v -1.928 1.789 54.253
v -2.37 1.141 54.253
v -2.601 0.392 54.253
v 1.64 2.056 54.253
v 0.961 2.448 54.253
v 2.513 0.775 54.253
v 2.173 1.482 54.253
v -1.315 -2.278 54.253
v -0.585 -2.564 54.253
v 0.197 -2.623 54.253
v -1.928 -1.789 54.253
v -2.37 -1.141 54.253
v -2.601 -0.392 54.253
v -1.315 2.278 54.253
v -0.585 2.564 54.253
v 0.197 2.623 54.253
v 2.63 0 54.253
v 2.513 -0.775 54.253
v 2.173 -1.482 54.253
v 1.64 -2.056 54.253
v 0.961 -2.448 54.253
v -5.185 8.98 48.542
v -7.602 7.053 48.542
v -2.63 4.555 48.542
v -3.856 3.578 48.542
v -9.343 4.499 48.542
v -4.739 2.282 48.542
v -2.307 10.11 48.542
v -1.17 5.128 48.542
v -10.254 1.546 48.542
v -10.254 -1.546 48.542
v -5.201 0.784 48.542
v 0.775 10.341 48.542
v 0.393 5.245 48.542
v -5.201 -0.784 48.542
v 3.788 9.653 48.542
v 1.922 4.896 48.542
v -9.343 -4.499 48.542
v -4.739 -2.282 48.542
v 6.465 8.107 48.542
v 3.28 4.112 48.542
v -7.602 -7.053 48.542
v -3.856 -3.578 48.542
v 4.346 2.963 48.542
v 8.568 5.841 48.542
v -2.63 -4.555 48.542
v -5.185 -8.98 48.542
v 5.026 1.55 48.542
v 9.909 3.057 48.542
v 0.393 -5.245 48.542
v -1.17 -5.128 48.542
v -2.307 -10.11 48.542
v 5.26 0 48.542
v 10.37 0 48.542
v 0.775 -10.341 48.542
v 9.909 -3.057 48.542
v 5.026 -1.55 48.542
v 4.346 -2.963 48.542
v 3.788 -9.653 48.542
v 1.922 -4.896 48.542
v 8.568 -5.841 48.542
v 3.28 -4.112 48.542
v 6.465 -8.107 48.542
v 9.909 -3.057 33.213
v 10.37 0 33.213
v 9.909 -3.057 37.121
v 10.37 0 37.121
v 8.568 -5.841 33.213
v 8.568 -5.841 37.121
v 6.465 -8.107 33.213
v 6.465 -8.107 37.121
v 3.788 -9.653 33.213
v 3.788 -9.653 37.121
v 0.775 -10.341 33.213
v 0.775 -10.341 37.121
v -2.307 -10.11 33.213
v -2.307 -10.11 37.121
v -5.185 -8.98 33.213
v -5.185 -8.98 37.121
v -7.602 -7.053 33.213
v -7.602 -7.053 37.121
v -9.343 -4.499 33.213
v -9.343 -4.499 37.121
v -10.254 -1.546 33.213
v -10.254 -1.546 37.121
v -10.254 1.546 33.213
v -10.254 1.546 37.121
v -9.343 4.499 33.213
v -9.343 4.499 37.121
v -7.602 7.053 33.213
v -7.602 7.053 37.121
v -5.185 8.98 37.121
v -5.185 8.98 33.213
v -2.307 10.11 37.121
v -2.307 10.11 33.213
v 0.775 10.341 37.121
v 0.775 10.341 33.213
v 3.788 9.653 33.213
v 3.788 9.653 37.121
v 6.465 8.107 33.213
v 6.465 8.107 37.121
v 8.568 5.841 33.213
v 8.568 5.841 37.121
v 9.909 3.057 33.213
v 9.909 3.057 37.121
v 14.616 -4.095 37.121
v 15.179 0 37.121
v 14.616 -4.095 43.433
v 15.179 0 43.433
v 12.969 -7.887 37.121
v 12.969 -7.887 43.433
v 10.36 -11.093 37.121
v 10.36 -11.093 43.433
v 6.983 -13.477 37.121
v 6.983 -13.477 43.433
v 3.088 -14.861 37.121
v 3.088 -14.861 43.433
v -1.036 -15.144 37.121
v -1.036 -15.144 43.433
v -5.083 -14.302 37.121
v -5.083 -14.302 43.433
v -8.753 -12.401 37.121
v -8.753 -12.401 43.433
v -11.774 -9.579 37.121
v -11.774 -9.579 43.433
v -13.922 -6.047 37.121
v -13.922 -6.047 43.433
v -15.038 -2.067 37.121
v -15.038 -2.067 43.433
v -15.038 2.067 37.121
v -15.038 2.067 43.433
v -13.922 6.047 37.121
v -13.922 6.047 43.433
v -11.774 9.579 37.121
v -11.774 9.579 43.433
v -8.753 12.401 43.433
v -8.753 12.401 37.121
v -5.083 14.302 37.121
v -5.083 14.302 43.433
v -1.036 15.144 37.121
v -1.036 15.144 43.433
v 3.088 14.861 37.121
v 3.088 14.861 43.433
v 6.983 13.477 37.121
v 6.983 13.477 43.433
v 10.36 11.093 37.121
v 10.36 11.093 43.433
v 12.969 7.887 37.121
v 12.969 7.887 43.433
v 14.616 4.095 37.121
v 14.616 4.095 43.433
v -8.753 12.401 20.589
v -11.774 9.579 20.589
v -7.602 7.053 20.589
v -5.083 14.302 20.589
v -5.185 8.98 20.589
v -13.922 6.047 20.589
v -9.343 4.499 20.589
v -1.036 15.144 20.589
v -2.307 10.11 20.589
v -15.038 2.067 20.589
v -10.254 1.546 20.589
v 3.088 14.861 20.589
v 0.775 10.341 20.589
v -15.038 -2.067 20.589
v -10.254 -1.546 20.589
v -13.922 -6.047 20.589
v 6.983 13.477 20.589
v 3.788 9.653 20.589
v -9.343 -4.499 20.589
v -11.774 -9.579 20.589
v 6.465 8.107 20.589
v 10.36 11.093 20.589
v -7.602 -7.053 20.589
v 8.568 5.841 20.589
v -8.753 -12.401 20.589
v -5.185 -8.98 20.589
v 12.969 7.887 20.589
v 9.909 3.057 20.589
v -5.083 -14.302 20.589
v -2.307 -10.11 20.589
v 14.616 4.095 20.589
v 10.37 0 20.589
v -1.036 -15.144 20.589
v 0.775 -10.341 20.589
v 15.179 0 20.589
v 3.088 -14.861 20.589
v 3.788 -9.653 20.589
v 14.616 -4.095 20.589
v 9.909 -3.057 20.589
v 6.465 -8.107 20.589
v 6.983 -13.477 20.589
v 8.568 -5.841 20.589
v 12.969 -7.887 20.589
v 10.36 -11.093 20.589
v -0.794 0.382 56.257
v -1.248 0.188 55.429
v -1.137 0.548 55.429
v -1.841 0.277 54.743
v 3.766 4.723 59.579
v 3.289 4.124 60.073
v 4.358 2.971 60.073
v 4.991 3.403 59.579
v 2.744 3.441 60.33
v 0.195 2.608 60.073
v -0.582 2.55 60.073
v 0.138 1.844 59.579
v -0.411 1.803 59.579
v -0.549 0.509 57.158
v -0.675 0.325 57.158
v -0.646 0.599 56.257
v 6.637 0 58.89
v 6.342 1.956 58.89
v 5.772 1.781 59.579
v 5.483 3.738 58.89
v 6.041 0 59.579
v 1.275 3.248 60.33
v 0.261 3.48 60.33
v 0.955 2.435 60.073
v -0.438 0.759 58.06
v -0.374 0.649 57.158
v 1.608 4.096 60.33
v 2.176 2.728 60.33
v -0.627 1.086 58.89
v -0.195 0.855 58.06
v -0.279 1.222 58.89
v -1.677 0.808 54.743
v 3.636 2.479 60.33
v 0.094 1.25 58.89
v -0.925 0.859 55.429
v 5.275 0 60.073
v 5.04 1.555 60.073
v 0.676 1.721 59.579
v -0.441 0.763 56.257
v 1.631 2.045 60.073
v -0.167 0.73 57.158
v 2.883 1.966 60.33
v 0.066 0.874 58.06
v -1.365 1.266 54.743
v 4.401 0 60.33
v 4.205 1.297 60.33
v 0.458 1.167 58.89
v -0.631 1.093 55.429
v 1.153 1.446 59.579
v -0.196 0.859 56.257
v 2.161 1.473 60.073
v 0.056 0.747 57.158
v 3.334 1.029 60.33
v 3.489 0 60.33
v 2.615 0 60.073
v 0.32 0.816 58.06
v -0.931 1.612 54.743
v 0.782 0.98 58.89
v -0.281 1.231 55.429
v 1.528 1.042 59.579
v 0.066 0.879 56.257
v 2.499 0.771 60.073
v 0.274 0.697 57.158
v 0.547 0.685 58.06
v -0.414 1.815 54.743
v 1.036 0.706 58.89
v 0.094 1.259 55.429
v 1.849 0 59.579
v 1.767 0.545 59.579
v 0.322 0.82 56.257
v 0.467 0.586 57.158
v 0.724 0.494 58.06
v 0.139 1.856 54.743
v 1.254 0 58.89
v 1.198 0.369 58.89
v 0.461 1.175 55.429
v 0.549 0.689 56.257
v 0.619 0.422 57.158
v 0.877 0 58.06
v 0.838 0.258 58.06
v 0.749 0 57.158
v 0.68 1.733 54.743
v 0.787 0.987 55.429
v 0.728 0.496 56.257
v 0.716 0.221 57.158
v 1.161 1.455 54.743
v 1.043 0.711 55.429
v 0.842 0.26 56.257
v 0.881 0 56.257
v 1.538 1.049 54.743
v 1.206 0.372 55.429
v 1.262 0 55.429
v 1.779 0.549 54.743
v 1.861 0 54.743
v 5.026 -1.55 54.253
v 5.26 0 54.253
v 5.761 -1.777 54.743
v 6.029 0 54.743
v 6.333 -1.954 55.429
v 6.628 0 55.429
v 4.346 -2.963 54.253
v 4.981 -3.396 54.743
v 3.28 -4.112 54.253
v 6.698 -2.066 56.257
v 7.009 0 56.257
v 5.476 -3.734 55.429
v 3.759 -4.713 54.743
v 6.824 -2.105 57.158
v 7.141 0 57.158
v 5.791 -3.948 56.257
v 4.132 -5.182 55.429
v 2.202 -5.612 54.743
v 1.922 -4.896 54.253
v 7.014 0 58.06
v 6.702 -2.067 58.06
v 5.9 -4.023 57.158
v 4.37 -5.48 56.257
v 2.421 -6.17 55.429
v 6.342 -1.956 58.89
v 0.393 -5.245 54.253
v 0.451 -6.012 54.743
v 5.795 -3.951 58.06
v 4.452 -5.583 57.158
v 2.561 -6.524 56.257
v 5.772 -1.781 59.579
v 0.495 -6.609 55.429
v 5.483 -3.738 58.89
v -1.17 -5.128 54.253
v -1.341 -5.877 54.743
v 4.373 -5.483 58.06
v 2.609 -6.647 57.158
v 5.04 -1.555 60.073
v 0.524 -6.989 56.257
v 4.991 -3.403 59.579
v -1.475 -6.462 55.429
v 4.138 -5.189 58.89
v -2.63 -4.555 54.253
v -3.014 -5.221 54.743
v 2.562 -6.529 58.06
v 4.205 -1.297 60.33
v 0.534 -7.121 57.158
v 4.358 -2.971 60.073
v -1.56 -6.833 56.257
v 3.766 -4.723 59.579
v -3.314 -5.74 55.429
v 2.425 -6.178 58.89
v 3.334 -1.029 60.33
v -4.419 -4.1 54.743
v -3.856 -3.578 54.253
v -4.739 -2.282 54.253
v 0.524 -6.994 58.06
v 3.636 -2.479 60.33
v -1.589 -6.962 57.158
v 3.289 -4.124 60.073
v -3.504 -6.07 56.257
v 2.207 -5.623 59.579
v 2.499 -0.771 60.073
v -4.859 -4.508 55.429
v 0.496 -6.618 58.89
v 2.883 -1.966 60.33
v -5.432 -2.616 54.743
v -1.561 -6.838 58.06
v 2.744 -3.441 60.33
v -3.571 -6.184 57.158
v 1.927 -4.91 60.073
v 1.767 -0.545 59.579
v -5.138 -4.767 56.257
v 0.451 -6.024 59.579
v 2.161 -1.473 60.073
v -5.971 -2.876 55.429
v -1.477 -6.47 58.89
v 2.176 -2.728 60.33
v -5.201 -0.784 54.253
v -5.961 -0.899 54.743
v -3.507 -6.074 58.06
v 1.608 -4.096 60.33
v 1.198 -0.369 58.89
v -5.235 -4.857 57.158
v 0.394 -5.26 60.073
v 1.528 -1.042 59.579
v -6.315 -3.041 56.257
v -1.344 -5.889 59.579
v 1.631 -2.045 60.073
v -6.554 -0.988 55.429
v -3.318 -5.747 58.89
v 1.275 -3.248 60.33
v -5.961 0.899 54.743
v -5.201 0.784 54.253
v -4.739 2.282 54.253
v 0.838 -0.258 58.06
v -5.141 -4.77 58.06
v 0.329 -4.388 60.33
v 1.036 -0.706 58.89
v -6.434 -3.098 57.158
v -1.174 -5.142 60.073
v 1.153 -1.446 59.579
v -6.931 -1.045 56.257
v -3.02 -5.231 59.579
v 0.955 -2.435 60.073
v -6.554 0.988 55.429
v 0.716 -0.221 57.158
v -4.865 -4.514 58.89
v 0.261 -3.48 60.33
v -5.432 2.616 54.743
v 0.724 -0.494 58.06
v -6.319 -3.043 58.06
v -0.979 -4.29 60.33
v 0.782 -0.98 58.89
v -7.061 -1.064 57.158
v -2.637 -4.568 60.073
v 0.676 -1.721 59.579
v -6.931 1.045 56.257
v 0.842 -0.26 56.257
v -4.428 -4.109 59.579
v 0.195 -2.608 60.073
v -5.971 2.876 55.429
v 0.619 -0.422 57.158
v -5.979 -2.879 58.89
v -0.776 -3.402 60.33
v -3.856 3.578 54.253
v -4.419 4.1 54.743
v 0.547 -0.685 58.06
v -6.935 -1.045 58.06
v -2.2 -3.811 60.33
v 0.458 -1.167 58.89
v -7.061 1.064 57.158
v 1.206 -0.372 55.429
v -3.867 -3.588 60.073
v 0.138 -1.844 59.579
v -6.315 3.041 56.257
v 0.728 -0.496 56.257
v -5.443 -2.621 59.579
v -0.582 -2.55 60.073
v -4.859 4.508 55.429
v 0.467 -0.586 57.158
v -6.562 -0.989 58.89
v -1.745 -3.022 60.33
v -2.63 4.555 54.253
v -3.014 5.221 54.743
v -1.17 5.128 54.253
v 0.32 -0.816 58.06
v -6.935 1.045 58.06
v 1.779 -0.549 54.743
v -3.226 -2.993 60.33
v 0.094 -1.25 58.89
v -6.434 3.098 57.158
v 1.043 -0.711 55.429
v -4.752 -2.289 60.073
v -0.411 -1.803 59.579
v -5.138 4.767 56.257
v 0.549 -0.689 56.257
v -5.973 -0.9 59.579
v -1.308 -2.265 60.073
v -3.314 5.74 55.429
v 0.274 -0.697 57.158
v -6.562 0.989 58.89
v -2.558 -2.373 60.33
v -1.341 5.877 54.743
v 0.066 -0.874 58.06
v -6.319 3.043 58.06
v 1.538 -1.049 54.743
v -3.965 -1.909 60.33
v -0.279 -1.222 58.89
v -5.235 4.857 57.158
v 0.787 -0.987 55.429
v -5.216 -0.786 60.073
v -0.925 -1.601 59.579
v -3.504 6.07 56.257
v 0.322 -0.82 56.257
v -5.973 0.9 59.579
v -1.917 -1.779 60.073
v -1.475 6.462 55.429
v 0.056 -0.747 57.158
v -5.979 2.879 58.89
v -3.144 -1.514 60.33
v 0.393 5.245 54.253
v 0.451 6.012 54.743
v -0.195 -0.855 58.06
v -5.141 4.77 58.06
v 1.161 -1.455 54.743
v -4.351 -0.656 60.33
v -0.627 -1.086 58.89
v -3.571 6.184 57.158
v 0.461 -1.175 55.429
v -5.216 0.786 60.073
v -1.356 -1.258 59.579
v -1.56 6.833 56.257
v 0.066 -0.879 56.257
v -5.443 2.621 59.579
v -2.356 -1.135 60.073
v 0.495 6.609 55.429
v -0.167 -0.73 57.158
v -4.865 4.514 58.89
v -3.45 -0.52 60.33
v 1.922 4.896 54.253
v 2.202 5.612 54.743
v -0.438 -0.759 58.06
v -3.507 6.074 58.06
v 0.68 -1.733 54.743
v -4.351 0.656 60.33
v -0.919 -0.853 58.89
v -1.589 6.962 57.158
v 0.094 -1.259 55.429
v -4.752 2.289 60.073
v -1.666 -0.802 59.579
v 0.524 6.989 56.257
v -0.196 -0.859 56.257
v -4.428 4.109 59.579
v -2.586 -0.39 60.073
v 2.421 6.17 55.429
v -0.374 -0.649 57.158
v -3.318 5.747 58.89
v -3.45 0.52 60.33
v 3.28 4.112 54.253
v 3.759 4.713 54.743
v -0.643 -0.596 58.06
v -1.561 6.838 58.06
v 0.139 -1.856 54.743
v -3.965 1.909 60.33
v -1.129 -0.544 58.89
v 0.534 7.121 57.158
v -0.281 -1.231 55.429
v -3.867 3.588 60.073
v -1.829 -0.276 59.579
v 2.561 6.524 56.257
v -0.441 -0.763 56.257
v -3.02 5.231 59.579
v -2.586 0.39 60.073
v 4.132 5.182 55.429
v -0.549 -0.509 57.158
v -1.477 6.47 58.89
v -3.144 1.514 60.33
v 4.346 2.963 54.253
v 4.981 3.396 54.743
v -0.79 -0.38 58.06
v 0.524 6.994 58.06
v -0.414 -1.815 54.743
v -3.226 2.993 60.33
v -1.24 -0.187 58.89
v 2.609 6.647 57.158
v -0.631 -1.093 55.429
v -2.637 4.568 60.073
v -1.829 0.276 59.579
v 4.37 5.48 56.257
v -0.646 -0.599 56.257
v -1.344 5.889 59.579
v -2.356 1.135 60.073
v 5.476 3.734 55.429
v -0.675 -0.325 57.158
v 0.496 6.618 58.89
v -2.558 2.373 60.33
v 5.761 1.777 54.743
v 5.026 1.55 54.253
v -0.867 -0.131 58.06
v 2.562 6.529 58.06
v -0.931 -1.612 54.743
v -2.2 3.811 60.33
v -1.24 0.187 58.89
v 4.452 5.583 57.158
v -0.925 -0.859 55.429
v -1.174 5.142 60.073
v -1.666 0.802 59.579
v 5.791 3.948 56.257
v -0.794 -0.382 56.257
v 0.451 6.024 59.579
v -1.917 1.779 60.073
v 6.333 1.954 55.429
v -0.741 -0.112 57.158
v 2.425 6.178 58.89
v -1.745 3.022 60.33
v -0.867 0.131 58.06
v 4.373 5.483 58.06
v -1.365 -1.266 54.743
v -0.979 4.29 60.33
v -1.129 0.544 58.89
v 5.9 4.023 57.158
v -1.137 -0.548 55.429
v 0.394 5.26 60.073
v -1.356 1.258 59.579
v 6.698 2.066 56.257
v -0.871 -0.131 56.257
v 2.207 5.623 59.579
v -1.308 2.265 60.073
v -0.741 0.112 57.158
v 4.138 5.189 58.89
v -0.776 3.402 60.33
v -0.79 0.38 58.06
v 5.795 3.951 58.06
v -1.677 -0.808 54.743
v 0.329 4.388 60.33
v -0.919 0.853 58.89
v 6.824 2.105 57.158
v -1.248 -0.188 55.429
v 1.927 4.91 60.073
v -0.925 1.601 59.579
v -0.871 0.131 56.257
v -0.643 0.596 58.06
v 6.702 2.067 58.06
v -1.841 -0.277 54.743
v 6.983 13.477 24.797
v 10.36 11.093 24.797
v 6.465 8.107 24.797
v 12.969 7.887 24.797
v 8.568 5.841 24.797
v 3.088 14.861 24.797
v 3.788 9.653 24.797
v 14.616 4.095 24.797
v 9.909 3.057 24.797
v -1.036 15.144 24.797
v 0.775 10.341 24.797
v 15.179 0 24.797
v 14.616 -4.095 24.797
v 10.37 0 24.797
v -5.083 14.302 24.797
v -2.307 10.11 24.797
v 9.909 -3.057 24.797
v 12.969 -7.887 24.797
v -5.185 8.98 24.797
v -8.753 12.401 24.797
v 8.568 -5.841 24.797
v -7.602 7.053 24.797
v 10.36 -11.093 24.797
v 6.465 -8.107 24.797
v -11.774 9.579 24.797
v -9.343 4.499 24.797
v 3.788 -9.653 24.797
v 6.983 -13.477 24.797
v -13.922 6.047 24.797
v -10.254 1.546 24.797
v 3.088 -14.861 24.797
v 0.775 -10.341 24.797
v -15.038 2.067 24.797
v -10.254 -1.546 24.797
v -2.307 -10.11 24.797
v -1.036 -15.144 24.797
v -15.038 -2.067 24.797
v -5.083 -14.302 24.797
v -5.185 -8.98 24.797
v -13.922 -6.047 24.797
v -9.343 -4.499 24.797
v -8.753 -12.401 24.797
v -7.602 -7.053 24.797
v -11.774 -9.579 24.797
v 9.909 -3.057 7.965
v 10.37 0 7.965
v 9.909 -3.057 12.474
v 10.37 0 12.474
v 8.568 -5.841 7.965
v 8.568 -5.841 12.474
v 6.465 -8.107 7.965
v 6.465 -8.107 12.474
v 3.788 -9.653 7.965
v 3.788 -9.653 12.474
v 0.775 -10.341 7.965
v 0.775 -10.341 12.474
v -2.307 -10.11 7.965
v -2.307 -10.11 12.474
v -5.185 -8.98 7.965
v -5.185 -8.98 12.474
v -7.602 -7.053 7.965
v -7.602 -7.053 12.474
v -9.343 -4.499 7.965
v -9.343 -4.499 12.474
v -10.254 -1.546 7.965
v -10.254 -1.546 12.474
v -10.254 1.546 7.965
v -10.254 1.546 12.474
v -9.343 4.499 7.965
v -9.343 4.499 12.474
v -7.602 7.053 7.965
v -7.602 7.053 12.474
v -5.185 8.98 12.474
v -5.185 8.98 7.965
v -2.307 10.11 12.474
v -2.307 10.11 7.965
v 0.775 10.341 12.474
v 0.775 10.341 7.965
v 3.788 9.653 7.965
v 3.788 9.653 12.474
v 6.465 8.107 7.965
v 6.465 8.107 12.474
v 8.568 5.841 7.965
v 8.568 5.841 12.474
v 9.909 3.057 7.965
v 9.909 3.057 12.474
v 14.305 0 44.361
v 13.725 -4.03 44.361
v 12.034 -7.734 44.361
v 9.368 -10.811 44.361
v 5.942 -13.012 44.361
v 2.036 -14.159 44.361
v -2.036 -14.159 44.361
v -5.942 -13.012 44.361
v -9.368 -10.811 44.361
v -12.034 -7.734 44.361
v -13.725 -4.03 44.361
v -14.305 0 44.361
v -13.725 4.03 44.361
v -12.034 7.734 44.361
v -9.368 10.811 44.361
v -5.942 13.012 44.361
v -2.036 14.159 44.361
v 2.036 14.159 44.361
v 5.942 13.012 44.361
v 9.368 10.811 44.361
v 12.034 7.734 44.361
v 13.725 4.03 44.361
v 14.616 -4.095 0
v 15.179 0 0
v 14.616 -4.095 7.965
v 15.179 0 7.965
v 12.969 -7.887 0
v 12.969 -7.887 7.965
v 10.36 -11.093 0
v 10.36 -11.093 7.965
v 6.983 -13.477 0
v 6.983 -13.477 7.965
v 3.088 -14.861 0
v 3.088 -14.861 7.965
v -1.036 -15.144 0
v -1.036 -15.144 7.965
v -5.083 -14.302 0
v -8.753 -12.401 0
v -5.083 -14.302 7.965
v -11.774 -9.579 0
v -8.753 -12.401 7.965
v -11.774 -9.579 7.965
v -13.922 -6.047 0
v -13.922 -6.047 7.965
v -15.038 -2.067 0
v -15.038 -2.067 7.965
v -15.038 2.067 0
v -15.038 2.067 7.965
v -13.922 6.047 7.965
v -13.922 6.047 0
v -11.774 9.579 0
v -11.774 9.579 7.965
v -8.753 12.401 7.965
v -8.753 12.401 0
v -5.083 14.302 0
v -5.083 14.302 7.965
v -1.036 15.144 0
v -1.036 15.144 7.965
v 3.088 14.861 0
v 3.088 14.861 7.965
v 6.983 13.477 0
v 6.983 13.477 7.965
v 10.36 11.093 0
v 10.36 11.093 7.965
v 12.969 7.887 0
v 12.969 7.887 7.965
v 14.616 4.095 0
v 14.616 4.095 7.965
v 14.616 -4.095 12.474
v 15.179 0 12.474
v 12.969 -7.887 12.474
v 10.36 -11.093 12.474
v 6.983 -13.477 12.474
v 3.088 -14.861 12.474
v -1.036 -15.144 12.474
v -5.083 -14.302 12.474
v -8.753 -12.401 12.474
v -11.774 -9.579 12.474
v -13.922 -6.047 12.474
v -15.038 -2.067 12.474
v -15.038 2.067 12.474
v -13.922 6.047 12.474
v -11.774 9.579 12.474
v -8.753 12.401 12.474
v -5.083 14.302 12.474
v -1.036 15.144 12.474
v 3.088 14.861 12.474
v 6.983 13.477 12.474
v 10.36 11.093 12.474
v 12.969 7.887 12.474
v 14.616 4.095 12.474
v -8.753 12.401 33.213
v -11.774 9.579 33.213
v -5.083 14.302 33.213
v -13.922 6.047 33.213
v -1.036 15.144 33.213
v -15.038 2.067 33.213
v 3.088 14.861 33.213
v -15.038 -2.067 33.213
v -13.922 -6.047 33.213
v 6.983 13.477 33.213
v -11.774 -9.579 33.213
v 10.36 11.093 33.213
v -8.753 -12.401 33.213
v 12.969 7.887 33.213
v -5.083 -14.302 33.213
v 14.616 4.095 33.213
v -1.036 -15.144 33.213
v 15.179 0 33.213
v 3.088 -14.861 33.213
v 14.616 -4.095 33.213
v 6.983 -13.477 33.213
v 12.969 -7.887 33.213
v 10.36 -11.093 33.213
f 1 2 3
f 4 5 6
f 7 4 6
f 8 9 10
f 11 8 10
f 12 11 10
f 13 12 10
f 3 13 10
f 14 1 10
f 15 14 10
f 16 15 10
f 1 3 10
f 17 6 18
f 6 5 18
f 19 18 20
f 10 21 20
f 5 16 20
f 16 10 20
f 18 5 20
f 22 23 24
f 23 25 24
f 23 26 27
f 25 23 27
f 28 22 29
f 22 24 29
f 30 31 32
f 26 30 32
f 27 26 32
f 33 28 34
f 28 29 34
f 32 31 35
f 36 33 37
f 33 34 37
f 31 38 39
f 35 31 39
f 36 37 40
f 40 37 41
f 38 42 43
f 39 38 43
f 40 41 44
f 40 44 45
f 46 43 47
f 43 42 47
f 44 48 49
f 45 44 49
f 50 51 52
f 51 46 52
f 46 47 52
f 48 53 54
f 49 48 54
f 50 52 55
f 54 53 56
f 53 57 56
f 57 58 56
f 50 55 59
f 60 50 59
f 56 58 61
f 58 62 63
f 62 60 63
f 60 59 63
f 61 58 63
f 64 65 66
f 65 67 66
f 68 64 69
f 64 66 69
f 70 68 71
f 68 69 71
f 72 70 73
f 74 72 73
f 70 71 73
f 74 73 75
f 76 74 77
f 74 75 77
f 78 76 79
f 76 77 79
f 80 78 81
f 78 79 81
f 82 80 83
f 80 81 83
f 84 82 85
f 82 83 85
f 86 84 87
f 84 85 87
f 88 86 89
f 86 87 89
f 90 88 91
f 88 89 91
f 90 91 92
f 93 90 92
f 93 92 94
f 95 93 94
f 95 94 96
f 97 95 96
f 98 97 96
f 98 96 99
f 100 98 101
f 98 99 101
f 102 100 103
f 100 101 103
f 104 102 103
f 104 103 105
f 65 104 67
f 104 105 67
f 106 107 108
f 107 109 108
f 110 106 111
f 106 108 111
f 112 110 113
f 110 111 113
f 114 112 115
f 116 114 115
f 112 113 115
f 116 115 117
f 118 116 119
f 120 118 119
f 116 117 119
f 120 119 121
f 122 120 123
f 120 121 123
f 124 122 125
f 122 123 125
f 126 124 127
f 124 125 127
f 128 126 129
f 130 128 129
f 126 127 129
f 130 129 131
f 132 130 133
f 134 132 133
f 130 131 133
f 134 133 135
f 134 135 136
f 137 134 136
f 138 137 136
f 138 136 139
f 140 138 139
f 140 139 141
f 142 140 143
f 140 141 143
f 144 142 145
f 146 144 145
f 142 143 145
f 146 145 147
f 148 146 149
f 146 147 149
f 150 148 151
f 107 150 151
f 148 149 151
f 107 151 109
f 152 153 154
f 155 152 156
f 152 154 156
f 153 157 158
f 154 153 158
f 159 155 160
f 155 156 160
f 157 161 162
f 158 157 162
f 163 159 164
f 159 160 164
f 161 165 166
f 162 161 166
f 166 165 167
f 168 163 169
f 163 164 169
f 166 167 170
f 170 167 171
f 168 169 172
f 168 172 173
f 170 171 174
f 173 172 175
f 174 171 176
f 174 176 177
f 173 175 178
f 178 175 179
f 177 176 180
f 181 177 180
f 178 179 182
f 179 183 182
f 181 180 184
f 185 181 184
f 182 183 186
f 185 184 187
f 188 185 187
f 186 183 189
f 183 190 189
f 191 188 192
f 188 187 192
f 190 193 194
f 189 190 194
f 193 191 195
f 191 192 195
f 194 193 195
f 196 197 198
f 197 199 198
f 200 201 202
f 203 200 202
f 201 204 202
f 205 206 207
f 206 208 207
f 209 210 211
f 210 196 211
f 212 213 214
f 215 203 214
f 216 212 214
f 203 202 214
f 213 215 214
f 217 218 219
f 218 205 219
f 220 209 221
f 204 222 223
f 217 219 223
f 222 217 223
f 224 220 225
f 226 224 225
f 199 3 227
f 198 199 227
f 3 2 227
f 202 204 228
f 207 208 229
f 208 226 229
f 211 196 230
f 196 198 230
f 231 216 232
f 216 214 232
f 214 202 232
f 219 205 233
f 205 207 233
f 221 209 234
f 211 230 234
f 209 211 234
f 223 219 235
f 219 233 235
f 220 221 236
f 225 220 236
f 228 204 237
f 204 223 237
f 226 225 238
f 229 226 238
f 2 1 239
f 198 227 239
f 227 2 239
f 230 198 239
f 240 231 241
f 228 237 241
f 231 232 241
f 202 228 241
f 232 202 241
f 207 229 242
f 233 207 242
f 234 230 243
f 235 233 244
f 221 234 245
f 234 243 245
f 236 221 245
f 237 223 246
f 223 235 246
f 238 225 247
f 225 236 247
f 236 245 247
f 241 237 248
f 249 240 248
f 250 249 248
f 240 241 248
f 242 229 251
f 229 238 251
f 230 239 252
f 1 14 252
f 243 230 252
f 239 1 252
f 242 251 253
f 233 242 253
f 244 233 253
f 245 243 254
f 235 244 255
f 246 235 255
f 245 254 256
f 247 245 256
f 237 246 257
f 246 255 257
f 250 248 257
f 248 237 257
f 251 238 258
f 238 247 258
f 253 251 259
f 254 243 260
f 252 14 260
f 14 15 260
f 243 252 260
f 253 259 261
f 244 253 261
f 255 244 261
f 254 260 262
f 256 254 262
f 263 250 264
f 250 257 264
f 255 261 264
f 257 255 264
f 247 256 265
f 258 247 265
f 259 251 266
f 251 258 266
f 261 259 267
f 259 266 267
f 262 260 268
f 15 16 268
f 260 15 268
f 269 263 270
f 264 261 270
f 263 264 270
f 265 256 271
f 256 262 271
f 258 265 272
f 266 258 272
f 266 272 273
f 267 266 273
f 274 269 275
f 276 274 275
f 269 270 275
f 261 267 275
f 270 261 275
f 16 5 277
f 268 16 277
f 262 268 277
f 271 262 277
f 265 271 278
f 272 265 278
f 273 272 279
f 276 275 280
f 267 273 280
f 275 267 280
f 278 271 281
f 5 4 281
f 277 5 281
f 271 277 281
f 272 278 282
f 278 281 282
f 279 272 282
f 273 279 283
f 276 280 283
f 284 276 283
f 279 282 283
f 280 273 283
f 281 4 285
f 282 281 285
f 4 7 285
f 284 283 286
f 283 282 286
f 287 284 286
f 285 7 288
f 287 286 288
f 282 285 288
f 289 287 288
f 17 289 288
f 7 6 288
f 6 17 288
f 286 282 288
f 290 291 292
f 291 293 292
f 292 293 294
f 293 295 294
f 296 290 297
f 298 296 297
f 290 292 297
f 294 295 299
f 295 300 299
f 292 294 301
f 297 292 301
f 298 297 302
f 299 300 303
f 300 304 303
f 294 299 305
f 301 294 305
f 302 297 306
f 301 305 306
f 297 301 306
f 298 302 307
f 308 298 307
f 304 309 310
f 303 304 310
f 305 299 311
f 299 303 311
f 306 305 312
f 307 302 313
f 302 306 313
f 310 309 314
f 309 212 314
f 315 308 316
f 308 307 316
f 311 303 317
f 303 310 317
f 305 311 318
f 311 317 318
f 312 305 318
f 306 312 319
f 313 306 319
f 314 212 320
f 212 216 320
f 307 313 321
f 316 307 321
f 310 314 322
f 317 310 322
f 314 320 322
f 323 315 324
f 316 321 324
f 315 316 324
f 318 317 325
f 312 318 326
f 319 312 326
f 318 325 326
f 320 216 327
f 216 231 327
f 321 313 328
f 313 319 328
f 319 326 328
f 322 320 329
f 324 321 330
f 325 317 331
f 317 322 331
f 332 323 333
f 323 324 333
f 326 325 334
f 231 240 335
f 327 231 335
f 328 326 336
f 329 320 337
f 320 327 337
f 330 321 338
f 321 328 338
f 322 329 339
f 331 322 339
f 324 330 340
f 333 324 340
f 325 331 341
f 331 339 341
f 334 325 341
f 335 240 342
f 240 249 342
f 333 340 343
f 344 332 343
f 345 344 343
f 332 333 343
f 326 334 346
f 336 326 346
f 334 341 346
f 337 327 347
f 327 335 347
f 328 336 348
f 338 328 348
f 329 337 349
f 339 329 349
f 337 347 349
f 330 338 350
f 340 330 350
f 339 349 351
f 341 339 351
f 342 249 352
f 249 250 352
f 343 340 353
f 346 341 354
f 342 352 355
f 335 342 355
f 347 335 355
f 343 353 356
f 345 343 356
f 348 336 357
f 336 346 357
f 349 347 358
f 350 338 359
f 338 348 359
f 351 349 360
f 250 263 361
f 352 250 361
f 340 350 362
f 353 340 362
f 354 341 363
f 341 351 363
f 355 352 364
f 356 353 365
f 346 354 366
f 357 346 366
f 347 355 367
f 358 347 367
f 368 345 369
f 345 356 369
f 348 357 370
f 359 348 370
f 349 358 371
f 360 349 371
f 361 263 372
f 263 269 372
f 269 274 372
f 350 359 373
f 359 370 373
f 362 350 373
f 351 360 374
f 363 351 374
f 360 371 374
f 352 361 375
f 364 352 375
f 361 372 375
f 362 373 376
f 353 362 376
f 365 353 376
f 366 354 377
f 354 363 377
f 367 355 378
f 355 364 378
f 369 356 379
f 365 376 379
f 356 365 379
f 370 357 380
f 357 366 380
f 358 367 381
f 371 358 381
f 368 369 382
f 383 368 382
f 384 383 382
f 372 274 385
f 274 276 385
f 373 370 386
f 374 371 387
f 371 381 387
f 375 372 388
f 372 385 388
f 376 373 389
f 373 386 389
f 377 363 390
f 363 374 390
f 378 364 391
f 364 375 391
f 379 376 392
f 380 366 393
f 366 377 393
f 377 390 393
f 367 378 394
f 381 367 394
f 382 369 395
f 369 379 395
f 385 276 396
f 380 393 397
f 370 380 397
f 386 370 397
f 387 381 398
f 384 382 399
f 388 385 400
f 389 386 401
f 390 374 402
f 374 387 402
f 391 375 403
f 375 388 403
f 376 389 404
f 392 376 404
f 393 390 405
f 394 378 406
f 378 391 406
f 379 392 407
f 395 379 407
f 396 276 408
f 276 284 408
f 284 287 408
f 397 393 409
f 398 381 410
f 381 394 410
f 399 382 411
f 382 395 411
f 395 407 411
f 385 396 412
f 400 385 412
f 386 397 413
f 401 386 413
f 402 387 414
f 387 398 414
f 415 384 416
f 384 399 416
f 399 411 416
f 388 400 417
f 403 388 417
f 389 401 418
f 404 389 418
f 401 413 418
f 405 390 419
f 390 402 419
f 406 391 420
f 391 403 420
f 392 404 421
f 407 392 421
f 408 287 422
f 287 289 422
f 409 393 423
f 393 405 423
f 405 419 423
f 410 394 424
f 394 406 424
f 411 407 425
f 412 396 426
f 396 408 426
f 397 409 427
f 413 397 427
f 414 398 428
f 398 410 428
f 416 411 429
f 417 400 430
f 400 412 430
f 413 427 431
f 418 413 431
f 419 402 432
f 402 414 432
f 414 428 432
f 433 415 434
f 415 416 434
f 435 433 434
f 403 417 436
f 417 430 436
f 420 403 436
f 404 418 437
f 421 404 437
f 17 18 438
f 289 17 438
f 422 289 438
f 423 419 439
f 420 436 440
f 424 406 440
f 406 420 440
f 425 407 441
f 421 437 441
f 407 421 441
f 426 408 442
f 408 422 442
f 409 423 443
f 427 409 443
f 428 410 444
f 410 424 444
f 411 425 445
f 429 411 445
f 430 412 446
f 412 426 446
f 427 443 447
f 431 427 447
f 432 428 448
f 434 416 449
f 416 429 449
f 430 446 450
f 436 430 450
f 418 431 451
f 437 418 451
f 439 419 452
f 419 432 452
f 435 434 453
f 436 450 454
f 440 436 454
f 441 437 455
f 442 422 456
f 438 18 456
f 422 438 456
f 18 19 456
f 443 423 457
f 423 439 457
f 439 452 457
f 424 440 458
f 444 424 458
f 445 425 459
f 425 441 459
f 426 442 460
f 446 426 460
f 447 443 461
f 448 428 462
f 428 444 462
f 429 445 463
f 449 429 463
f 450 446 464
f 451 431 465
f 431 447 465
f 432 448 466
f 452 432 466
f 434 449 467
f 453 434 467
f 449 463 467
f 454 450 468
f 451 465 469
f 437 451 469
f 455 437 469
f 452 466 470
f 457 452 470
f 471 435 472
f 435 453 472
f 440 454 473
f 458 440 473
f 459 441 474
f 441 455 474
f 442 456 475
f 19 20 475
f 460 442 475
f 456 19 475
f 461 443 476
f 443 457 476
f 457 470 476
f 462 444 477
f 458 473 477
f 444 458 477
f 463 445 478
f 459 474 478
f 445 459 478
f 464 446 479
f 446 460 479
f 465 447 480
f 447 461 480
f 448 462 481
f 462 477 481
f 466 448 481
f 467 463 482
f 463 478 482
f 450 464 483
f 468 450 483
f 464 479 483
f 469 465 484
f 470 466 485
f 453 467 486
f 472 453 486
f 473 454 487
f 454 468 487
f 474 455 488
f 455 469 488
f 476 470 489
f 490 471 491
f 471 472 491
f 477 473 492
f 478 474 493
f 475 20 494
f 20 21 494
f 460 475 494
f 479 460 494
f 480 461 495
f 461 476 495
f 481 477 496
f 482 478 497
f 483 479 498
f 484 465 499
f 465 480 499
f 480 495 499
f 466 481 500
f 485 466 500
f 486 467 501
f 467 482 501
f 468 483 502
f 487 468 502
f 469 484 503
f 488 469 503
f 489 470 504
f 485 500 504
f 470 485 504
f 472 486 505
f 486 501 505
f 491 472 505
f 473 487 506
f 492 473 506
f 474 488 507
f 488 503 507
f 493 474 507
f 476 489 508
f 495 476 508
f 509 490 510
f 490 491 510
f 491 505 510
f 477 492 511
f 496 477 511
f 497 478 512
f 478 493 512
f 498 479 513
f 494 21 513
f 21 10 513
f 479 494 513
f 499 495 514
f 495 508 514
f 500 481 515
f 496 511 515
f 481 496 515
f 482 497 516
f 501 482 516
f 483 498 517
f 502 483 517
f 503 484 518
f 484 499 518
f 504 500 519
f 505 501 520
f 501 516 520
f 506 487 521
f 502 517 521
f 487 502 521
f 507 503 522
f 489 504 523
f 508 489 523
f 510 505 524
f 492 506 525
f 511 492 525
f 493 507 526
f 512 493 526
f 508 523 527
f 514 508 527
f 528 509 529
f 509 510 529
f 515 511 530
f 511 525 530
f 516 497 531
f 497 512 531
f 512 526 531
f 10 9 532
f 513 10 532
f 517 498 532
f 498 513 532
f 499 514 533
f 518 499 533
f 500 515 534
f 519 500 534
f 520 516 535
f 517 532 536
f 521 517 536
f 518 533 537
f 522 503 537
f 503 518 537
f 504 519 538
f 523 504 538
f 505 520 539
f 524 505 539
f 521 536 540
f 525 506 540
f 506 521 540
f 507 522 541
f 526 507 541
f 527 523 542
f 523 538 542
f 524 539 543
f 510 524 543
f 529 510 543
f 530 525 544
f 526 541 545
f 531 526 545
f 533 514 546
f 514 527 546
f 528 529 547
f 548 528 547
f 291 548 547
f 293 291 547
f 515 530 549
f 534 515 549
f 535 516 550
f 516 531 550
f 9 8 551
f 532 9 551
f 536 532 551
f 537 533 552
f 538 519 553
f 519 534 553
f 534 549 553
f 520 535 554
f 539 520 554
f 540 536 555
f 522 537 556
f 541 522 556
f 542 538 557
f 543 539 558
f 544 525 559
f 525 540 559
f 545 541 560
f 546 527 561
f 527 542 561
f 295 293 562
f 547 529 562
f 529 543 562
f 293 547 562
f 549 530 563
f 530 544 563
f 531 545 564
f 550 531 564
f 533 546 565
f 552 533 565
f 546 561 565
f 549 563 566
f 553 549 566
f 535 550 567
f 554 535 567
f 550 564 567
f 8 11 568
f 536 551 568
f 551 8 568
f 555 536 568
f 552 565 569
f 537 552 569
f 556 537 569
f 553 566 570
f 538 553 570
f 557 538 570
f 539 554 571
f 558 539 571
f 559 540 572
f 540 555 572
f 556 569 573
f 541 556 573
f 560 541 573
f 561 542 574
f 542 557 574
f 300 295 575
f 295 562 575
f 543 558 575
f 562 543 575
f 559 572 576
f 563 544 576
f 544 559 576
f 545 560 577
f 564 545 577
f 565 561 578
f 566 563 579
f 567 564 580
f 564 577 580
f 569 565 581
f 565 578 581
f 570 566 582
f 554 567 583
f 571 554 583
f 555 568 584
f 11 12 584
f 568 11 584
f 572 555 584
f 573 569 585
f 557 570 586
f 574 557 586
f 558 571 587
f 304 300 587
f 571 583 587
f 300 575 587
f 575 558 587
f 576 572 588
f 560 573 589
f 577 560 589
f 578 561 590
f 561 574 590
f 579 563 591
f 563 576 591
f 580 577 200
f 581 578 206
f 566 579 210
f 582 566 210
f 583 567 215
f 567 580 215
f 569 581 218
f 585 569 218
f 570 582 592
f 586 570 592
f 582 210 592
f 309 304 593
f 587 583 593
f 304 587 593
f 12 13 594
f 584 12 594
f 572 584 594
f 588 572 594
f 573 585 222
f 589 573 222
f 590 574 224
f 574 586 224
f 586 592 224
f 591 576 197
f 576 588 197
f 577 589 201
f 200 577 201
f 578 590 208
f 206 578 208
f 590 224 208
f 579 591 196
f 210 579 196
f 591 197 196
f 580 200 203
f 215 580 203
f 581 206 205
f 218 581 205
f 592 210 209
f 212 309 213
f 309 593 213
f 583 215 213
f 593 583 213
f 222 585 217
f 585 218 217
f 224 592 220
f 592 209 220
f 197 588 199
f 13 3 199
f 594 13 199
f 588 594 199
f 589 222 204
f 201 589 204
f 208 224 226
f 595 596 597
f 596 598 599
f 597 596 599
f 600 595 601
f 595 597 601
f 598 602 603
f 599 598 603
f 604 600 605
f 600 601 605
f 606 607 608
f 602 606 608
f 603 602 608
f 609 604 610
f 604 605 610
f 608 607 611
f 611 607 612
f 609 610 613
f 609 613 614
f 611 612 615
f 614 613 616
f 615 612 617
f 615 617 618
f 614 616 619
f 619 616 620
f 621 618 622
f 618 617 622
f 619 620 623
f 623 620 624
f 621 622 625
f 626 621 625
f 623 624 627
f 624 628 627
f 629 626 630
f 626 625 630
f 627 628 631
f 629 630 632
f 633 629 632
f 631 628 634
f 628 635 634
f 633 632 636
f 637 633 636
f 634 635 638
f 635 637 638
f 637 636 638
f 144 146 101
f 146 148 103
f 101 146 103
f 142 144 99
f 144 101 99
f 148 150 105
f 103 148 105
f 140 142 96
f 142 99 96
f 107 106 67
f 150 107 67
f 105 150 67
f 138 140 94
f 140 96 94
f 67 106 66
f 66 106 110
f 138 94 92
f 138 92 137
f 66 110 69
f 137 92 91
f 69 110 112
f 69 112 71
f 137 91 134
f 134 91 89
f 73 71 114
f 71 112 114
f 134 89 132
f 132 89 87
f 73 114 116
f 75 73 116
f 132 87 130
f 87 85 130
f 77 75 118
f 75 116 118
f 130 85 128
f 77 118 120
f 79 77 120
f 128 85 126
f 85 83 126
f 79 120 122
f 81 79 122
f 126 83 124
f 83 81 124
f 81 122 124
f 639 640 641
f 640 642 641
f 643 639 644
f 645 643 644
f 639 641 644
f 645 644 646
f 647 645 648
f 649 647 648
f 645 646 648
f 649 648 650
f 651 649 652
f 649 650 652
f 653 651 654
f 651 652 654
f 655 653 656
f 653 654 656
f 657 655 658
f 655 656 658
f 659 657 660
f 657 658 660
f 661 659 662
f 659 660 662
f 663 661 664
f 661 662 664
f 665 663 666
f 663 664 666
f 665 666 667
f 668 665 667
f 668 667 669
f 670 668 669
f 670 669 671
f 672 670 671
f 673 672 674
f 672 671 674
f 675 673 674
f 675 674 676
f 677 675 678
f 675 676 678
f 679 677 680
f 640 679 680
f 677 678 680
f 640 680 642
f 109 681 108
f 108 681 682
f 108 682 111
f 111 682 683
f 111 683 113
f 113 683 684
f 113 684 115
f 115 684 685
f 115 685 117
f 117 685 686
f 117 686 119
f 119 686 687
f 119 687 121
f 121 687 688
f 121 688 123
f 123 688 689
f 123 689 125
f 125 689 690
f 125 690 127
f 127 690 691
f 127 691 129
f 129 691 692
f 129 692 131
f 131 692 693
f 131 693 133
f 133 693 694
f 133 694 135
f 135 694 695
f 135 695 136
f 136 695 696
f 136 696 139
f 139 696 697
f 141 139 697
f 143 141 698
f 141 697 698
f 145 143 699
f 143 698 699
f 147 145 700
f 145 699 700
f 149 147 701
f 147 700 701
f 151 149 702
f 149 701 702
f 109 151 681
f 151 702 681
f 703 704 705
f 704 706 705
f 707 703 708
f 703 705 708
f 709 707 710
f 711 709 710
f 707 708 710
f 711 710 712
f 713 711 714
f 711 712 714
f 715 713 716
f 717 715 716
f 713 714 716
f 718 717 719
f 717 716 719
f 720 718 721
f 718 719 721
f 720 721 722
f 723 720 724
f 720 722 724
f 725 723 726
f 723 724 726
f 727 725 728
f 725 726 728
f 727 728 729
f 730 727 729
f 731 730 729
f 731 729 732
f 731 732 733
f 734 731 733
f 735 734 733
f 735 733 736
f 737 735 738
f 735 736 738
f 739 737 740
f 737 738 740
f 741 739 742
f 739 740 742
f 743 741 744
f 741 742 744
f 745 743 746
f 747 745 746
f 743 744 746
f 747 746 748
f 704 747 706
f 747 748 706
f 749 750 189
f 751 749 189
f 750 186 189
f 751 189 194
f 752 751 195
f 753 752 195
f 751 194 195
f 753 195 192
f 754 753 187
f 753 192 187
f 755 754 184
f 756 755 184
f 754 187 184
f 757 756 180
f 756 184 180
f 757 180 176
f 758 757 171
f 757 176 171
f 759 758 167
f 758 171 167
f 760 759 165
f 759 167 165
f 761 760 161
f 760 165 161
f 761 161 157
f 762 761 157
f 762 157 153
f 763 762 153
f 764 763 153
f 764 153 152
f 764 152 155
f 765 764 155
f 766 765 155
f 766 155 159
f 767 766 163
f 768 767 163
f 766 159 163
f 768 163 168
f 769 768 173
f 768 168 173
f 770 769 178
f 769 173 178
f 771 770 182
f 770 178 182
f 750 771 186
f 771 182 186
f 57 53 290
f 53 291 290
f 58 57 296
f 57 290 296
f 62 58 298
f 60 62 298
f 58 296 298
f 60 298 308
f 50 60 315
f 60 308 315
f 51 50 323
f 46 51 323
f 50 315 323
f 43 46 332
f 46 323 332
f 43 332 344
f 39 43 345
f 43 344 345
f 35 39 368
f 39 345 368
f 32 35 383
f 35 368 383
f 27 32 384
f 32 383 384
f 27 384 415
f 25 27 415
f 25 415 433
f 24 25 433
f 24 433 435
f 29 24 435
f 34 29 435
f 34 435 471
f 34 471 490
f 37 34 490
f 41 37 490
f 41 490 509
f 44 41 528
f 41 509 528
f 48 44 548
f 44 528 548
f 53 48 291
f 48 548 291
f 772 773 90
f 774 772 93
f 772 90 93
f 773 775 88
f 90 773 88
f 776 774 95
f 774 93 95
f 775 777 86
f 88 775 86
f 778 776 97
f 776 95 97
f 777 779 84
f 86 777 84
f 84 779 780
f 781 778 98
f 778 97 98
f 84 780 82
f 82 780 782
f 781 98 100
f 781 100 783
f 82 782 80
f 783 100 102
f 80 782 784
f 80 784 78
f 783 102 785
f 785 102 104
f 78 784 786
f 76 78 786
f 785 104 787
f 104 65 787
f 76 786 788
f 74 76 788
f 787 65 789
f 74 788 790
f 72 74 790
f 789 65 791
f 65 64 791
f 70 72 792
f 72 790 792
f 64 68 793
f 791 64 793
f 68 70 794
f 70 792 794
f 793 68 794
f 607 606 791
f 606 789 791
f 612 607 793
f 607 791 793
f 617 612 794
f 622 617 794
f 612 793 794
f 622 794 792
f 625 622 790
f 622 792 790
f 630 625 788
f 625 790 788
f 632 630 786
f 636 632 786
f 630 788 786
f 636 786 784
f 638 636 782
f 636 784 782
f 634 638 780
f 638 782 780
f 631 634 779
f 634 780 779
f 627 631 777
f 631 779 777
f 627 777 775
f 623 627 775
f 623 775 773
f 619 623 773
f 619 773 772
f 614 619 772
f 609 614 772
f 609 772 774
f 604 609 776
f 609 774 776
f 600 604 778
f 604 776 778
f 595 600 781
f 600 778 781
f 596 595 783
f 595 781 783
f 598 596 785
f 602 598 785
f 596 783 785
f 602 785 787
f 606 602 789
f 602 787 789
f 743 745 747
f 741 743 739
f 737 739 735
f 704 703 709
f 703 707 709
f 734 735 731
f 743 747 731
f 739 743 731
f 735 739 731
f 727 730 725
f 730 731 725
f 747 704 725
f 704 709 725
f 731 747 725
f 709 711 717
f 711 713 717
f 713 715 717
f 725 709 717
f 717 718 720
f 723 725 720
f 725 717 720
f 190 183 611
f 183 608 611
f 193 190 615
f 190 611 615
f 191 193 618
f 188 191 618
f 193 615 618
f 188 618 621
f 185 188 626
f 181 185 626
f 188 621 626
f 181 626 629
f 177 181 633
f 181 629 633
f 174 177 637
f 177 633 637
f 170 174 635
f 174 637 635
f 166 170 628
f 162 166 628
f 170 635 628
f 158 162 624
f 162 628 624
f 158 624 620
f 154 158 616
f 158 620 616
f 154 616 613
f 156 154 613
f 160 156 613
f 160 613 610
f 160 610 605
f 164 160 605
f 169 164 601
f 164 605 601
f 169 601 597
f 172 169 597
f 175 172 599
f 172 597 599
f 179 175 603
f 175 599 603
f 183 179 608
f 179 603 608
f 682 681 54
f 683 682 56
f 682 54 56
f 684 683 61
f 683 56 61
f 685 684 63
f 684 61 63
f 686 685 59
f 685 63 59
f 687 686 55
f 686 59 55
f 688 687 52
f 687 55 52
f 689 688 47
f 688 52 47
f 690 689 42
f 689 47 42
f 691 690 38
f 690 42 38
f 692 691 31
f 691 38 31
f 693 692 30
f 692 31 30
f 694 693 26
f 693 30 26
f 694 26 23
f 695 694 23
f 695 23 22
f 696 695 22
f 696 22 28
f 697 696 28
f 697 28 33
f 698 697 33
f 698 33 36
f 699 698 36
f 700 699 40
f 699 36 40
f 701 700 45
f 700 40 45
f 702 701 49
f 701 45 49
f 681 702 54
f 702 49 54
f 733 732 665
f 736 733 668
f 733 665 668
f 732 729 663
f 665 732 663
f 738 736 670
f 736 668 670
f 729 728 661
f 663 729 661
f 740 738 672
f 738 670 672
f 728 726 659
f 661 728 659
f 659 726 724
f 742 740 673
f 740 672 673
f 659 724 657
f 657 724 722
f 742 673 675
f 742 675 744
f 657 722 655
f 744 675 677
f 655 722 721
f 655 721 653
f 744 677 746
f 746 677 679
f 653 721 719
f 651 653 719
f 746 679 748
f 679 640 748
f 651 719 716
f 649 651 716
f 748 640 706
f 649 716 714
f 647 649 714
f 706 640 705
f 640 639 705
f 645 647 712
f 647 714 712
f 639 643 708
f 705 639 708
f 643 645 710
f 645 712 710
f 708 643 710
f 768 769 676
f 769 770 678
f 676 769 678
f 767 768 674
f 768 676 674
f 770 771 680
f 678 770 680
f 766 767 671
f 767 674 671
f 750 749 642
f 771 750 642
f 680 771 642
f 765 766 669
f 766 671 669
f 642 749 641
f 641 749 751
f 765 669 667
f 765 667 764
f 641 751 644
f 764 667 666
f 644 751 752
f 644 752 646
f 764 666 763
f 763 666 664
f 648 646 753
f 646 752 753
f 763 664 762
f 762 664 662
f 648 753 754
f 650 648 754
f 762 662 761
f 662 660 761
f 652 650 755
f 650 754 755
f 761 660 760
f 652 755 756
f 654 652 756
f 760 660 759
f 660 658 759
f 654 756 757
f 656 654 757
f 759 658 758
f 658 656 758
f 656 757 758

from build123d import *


with BuildPart() as f1:
    # F0 (on Front) → F1 (revolve)
    with BuildSketch(Plane.XZ):
        Polygon((0, 54.25334), (0, 0), (15.178914, 0), (15.178914, 7.965172), (10.369752, 7.965172), (10.369752, 12.47376), (15.178914, 12.47376), (15.178914, 20.589218), (10.369752, 20.589218), (10.369752, 24.797235), (15.178914, 24.797235), (15.178914, 33.213265), (10.369752, 33.213265), (10.369752, 37.120707), (15.178914, 37.120707), (15.178914, 43.432731), (14.304863, 44.36141), (10.369752, 48.542466), (5.26002, 48.542466), (5.26002, 54.25334), (2.63001, 54.25334), align=None)
        with BuildLine():
            ThreePointArc((5.26002, 54.25334), (3.945015, 60.362486), (2.63001, 54.25334))
            Line((2.63001, 54.25334), (5.26002, 54.25334))
        make_face()
    revolve(axis=Axis((0, 0, 27.12667), (0, 0, -1)))


solid = f1.part
